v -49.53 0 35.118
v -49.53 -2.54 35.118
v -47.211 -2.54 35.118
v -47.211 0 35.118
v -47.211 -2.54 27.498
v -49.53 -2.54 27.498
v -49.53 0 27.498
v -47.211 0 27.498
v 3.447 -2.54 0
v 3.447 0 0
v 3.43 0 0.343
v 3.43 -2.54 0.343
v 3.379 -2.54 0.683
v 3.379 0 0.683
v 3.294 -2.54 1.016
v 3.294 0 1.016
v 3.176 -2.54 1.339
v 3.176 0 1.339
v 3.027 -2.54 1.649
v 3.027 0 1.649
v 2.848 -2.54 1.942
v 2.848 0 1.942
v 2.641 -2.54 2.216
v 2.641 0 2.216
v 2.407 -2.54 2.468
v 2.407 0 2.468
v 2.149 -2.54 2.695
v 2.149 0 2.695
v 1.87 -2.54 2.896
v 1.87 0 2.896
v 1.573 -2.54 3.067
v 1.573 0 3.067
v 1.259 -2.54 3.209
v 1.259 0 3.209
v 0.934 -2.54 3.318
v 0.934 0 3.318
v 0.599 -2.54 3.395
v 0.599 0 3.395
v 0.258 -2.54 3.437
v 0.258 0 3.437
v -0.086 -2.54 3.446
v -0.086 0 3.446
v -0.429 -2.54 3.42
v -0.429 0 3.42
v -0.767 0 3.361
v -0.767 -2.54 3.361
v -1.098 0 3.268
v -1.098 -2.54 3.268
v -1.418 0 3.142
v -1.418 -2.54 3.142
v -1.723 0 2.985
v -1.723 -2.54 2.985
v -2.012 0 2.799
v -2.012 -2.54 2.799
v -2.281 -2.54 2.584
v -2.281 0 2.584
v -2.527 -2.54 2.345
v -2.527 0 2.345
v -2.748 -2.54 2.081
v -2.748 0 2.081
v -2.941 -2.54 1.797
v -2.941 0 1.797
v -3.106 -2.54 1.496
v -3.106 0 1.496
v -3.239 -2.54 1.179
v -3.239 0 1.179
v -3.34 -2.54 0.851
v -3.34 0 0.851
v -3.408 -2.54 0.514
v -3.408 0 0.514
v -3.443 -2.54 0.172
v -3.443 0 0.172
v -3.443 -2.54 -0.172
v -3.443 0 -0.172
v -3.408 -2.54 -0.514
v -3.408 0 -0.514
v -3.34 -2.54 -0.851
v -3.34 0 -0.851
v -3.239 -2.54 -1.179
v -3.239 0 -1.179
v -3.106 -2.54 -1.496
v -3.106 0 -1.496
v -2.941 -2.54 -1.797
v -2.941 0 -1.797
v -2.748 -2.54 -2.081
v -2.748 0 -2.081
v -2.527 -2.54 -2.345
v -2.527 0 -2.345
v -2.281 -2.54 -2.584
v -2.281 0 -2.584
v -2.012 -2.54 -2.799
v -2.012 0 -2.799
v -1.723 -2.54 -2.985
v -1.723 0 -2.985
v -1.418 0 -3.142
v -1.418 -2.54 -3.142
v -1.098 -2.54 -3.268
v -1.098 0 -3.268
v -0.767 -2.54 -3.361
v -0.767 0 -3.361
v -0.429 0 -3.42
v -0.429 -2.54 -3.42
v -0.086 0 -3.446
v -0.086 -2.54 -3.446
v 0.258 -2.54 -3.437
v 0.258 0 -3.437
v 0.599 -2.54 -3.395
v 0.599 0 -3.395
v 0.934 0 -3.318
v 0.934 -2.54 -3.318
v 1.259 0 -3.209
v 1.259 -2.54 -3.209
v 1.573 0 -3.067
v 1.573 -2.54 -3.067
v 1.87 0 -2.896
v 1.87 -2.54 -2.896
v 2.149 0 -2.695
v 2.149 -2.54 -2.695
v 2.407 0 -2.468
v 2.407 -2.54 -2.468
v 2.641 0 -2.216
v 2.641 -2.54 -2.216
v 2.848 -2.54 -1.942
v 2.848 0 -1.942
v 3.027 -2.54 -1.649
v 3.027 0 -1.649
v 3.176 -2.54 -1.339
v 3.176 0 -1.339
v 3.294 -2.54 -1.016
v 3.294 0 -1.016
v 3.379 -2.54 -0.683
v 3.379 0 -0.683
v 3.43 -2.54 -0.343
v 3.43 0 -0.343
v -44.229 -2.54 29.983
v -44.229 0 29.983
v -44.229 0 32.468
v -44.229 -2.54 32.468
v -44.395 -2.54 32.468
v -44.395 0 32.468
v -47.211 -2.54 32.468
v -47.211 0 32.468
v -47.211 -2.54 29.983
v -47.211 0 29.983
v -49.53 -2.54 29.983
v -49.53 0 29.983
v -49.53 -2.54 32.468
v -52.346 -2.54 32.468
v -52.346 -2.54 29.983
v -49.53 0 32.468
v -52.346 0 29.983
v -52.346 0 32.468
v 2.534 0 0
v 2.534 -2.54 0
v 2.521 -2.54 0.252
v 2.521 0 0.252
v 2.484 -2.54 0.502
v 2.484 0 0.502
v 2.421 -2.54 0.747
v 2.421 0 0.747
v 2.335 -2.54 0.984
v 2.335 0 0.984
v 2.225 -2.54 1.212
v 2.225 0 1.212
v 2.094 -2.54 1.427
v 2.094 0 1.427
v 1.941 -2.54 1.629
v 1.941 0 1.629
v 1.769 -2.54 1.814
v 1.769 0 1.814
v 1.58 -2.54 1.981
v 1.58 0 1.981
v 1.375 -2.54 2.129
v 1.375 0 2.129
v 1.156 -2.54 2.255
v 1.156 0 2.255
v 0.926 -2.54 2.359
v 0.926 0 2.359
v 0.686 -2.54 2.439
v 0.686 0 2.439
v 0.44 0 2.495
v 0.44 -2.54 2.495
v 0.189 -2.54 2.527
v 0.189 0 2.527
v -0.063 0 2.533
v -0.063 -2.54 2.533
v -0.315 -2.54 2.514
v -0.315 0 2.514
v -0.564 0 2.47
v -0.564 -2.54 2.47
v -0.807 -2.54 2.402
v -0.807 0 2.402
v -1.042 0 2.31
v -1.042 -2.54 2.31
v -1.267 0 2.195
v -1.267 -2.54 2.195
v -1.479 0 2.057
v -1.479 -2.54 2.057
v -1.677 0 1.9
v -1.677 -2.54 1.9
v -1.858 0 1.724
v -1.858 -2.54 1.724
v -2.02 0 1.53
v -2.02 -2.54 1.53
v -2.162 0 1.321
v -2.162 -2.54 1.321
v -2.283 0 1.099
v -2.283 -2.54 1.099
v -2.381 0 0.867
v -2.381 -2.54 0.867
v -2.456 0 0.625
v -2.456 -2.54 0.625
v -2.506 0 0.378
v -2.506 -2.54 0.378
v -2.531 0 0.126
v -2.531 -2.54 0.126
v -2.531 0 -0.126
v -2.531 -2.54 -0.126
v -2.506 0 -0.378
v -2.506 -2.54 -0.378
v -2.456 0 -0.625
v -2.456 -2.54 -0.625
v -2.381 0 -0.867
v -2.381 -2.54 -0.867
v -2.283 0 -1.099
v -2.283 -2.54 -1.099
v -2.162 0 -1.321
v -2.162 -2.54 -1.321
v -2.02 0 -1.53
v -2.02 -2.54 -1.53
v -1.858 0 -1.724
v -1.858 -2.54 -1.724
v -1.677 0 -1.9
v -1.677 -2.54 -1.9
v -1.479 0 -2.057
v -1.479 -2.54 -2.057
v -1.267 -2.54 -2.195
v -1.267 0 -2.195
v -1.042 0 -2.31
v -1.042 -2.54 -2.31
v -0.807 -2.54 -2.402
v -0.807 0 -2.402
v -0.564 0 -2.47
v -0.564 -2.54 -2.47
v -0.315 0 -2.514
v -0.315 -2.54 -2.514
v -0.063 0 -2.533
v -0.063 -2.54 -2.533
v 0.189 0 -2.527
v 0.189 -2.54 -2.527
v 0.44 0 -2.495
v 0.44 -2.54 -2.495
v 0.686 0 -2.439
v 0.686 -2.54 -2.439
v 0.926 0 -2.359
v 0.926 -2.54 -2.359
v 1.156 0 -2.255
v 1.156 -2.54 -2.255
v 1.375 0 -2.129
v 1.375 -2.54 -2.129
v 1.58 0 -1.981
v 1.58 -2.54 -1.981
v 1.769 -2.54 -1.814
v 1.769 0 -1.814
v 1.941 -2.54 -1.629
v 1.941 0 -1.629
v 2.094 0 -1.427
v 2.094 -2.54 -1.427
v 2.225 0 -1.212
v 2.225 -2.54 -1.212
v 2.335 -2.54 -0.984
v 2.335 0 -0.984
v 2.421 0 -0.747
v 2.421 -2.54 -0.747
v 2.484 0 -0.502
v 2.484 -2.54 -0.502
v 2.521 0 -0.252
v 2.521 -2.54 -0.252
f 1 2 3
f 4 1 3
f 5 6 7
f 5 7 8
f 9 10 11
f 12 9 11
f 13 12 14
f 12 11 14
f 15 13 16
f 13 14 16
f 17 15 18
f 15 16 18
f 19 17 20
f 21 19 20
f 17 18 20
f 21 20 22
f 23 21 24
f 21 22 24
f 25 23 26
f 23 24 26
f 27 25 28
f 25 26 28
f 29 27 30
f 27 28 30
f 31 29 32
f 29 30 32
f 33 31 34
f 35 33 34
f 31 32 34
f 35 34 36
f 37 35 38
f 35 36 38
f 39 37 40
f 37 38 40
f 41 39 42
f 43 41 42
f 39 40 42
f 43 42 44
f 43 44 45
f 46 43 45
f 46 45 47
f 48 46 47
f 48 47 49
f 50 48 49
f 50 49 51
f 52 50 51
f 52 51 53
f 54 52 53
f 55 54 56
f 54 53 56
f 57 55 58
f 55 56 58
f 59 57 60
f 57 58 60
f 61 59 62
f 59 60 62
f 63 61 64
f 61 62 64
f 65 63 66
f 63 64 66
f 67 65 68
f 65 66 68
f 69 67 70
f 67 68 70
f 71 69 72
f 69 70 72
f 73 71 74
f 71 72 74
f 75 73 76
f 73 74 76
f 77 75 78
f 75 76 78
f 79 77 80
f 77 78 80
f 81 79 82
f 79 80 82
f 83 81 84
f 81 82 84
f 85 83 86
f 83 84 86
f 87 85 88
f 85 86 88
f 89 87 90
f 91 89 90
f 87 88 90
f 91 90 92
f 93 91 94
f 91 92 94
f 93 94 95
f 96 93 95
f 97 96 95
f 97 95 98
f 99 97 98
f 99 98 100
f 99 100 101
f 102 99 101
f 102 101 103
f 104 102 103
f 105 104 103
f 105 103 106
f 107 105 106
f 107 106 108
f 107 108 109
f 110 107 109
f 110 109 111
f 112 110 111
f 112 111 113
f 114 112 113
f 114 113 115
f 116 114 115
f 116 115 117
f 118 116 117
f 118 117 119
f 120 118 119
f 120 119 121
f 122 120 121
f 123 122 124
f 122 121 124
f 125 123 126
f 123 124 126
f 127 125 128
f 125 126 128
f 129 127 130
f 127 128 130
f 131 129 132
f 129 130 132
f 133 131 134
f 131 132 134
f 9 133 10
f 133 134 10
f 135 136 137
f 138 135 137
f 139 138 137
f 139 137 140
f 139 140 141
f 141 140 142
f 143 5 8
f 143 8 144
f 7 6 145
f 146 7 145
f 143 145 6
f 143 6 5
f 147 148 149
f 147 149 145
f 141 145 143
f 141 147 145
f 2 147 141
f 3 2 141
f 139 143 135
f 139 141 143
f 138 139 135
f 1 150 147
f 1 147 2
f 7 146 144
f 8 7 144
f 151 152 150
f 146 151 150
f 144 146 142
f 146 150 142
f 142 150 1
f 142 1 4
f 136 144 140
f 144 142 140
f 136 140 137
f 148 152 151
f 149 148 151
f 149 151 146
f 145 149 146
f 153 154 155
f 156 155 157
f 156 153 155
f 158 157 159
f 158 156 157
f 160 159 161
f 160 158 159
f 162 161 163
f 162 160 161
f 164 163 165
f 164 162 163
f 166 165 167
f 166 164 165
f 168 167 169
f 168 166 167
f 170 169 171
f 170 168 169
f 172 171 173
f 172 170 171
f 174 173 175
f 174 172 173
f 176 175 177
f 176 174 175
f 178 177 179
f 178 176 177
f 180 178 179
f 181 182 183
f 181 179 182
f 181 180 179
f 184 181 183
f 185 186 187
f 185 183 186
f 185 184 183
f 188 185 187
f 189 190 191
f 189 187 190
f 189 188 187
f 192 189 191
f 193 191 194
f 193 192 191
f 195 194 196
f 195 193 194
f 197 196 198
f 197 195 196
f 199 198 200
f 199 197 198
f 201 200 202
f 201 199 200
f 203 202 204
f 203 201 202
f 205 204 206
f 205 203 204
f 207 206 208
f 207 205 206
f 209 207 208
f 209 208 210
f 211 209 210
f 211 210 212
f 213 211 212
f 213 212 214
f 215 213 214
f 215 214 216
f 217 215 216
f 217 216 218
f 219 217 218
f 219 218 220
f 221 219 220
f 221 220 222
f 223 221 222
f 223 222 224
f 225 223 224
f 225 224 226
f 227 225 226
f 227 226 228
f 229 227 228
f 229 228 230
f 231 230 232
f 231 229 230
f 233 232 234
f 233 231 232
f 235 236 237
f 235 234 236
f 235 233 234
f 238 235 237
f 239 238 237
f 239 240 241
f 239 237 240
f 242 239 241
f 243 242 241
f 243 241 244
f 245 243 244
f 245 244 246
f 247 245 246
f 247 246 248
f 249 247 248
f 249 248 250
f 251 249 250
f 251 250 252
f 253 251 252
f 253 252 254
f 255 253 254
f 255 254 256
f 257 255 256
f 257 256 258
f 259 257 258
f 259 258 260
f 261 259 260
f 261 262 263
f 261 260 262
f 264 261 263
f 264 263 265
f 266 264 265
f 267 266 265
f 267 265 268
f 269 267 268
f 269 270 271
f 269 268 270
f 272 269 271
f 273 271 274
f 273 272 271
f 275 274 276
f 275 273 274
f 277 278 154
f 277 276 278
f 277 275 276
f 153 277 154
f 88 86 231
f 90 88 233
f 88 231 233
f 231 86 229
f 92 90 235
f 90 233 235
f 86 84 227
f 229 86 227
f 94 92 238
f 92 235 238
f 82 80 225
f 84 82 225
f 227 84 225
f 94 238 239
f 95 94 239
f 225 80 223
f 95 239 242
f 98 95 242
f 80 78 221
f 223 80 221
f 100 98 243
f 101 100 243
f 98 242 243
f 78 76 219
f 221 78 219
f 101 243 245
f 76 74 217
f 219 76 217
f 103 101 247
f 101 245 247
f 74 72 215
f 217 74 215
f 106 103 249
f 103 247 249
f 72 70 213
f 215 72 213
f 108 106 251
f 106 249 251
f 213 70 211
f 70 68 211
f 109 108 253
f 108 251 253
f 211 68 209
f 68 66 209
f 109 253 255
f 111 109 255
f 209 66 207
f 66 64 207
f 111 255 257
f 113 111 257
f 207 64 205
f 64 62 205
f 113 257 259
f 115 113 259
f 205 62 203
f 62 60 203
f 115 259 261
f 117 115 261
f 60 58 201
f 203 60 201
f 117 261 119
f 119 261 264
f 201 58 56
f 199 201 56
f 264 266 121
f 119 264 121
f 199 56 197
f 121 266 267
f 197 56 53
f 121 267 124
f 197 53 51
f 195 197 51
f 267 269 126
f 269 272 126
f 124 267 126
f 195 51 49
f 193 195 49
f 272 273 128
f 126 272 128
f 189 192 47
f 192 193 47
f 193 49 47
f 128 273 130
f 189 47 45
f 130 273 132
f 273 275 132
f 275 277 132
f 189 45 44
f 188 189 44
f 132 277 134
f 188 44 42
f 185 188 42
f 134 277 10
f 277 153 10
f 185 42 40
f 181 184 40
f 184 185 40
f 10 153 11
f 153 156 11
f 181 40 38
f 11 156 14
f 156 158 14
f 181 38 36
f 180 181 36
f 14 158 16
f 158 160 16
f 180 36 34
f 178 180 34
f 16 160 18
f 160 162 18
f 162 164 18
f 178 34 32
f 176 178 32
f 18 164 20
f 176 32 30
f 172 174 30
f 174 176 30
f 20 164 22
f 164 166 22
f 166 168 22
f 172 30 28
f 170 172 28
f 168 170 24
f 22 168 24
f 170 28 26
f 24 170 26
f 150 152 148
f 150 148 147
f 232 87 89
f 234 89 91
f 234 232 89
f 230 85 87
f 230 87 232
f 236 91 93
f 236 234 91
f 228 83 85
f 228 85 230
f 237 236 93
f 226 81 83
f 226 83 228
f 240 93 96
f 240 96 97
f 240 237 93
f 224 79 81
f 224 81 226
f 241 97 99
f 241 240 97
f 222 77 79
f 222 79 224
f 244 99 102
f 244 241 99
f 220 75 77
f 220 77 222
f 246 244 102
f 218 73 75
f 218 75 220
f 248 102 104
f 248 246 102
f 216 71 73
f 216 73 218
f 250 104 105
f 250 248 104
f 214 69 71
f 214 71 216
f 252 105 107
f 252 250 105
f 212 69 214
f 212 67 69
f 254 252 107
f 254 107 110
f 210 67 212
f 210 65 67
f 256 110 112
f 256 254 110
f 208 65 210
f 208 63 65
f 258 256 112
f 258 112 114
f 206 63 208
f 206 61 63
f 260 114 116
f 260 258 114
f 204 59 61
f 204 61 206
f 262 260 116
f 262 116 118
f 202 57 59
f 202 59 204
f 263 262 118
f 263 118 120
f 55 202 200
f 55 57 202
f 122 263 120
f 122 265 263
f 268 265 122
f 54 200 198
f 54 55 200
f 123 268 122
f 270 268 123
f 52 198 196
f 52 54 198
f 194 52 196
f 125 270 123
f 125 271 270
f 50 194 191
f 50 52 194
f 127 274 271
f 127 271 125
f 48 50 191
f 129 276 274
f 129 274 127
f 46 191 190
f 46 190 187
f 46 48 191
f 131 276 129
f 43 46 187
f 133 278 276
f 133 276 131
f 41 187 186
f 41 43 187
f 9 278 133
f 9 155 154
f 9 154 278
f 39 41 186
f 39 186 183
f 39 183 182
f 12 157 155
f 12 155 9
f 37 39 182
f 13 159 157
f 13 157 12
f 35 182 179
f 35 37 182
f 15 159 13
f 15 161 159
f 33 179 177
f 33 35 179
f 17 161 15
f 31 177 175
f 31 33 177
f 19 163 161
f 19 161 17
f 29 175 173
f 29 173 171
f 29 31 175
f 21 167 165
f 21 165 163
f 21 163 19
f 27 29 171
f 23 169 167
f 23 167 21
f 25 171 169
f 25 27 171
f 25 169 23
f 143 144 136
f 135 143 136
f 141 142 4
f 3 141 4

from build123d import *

# Parameters (mm, degrees)
F0_R     = 3.446998561
F1_DEPTH = 2.54
F2_R     = 2.5339910603
F3_DEPTH = 25.146
F4_W     = 2.8160847723
F4_H     = 1.1595673859
F4_W_2   = 2.3191347718
F4_H_2   = 2.650430426
F4_H_3   = 1.3252161443
F4_H_4   = 2.4847816676
F5_DEPTH = 2.54


with BuildPart() as f1:
    # F0 (on Front) → F1 (new body)
    with BuildSketch(Plane.XZ):
        Circle(F0_R)
    extrude(amount=F1_DEPTH)

    # F2 (on Front) → F3 (cut)
    with BuildSketch(Plane.XZ):
        Circle(F2_R)
    extrude(amount=F3_DEPTH, mode=Mode.SUBTRACT)


with BuildPart() as f5:
    # F4 (on Front) → F5 (new body)
    with BuildSketch(Plane.XZ):
        with Locations((-50.938045606, 31.8880435079)):
            Rectangle(F4_W, F4_H)
        with Locations((-48.3704358339, 33.7930424139)):
            Rectangle(F4_W_2, F4_H_2)
        with Locations((-48.3704358339, 31.8880435079)):
            Rectangle(F4_W_2, F4_H)
        with Locations((-50.938045606, 30.6456517428)):
            Rectangle(F4_W, F4_H_3)
        with Locations((-45.8028260618, 31.8880435079)):
            Rectangle(F4_W, F4_H)
        with Locations((-48.3704358339, 30.6456517428)):
            Rectangle(F4_W_2, F4_H_3)
        Polygon((-44.229131192, 32.4678272009), (-44.3947836757, 32.4678272009), (-44.3947836757, 31.308259815), (-47.210868448, 31.308259815), (-47.210868448, 29.9830436707), (-44.229131192, 29.9830436707), align=None)
        with Locations((-48.3704358339, 28.7406528369)):
            Rectangle(F4_W_2, F4_H_4)
    extrude(amount=F5_DEPTH)


solid = Compound([f1.part, f5.part])
